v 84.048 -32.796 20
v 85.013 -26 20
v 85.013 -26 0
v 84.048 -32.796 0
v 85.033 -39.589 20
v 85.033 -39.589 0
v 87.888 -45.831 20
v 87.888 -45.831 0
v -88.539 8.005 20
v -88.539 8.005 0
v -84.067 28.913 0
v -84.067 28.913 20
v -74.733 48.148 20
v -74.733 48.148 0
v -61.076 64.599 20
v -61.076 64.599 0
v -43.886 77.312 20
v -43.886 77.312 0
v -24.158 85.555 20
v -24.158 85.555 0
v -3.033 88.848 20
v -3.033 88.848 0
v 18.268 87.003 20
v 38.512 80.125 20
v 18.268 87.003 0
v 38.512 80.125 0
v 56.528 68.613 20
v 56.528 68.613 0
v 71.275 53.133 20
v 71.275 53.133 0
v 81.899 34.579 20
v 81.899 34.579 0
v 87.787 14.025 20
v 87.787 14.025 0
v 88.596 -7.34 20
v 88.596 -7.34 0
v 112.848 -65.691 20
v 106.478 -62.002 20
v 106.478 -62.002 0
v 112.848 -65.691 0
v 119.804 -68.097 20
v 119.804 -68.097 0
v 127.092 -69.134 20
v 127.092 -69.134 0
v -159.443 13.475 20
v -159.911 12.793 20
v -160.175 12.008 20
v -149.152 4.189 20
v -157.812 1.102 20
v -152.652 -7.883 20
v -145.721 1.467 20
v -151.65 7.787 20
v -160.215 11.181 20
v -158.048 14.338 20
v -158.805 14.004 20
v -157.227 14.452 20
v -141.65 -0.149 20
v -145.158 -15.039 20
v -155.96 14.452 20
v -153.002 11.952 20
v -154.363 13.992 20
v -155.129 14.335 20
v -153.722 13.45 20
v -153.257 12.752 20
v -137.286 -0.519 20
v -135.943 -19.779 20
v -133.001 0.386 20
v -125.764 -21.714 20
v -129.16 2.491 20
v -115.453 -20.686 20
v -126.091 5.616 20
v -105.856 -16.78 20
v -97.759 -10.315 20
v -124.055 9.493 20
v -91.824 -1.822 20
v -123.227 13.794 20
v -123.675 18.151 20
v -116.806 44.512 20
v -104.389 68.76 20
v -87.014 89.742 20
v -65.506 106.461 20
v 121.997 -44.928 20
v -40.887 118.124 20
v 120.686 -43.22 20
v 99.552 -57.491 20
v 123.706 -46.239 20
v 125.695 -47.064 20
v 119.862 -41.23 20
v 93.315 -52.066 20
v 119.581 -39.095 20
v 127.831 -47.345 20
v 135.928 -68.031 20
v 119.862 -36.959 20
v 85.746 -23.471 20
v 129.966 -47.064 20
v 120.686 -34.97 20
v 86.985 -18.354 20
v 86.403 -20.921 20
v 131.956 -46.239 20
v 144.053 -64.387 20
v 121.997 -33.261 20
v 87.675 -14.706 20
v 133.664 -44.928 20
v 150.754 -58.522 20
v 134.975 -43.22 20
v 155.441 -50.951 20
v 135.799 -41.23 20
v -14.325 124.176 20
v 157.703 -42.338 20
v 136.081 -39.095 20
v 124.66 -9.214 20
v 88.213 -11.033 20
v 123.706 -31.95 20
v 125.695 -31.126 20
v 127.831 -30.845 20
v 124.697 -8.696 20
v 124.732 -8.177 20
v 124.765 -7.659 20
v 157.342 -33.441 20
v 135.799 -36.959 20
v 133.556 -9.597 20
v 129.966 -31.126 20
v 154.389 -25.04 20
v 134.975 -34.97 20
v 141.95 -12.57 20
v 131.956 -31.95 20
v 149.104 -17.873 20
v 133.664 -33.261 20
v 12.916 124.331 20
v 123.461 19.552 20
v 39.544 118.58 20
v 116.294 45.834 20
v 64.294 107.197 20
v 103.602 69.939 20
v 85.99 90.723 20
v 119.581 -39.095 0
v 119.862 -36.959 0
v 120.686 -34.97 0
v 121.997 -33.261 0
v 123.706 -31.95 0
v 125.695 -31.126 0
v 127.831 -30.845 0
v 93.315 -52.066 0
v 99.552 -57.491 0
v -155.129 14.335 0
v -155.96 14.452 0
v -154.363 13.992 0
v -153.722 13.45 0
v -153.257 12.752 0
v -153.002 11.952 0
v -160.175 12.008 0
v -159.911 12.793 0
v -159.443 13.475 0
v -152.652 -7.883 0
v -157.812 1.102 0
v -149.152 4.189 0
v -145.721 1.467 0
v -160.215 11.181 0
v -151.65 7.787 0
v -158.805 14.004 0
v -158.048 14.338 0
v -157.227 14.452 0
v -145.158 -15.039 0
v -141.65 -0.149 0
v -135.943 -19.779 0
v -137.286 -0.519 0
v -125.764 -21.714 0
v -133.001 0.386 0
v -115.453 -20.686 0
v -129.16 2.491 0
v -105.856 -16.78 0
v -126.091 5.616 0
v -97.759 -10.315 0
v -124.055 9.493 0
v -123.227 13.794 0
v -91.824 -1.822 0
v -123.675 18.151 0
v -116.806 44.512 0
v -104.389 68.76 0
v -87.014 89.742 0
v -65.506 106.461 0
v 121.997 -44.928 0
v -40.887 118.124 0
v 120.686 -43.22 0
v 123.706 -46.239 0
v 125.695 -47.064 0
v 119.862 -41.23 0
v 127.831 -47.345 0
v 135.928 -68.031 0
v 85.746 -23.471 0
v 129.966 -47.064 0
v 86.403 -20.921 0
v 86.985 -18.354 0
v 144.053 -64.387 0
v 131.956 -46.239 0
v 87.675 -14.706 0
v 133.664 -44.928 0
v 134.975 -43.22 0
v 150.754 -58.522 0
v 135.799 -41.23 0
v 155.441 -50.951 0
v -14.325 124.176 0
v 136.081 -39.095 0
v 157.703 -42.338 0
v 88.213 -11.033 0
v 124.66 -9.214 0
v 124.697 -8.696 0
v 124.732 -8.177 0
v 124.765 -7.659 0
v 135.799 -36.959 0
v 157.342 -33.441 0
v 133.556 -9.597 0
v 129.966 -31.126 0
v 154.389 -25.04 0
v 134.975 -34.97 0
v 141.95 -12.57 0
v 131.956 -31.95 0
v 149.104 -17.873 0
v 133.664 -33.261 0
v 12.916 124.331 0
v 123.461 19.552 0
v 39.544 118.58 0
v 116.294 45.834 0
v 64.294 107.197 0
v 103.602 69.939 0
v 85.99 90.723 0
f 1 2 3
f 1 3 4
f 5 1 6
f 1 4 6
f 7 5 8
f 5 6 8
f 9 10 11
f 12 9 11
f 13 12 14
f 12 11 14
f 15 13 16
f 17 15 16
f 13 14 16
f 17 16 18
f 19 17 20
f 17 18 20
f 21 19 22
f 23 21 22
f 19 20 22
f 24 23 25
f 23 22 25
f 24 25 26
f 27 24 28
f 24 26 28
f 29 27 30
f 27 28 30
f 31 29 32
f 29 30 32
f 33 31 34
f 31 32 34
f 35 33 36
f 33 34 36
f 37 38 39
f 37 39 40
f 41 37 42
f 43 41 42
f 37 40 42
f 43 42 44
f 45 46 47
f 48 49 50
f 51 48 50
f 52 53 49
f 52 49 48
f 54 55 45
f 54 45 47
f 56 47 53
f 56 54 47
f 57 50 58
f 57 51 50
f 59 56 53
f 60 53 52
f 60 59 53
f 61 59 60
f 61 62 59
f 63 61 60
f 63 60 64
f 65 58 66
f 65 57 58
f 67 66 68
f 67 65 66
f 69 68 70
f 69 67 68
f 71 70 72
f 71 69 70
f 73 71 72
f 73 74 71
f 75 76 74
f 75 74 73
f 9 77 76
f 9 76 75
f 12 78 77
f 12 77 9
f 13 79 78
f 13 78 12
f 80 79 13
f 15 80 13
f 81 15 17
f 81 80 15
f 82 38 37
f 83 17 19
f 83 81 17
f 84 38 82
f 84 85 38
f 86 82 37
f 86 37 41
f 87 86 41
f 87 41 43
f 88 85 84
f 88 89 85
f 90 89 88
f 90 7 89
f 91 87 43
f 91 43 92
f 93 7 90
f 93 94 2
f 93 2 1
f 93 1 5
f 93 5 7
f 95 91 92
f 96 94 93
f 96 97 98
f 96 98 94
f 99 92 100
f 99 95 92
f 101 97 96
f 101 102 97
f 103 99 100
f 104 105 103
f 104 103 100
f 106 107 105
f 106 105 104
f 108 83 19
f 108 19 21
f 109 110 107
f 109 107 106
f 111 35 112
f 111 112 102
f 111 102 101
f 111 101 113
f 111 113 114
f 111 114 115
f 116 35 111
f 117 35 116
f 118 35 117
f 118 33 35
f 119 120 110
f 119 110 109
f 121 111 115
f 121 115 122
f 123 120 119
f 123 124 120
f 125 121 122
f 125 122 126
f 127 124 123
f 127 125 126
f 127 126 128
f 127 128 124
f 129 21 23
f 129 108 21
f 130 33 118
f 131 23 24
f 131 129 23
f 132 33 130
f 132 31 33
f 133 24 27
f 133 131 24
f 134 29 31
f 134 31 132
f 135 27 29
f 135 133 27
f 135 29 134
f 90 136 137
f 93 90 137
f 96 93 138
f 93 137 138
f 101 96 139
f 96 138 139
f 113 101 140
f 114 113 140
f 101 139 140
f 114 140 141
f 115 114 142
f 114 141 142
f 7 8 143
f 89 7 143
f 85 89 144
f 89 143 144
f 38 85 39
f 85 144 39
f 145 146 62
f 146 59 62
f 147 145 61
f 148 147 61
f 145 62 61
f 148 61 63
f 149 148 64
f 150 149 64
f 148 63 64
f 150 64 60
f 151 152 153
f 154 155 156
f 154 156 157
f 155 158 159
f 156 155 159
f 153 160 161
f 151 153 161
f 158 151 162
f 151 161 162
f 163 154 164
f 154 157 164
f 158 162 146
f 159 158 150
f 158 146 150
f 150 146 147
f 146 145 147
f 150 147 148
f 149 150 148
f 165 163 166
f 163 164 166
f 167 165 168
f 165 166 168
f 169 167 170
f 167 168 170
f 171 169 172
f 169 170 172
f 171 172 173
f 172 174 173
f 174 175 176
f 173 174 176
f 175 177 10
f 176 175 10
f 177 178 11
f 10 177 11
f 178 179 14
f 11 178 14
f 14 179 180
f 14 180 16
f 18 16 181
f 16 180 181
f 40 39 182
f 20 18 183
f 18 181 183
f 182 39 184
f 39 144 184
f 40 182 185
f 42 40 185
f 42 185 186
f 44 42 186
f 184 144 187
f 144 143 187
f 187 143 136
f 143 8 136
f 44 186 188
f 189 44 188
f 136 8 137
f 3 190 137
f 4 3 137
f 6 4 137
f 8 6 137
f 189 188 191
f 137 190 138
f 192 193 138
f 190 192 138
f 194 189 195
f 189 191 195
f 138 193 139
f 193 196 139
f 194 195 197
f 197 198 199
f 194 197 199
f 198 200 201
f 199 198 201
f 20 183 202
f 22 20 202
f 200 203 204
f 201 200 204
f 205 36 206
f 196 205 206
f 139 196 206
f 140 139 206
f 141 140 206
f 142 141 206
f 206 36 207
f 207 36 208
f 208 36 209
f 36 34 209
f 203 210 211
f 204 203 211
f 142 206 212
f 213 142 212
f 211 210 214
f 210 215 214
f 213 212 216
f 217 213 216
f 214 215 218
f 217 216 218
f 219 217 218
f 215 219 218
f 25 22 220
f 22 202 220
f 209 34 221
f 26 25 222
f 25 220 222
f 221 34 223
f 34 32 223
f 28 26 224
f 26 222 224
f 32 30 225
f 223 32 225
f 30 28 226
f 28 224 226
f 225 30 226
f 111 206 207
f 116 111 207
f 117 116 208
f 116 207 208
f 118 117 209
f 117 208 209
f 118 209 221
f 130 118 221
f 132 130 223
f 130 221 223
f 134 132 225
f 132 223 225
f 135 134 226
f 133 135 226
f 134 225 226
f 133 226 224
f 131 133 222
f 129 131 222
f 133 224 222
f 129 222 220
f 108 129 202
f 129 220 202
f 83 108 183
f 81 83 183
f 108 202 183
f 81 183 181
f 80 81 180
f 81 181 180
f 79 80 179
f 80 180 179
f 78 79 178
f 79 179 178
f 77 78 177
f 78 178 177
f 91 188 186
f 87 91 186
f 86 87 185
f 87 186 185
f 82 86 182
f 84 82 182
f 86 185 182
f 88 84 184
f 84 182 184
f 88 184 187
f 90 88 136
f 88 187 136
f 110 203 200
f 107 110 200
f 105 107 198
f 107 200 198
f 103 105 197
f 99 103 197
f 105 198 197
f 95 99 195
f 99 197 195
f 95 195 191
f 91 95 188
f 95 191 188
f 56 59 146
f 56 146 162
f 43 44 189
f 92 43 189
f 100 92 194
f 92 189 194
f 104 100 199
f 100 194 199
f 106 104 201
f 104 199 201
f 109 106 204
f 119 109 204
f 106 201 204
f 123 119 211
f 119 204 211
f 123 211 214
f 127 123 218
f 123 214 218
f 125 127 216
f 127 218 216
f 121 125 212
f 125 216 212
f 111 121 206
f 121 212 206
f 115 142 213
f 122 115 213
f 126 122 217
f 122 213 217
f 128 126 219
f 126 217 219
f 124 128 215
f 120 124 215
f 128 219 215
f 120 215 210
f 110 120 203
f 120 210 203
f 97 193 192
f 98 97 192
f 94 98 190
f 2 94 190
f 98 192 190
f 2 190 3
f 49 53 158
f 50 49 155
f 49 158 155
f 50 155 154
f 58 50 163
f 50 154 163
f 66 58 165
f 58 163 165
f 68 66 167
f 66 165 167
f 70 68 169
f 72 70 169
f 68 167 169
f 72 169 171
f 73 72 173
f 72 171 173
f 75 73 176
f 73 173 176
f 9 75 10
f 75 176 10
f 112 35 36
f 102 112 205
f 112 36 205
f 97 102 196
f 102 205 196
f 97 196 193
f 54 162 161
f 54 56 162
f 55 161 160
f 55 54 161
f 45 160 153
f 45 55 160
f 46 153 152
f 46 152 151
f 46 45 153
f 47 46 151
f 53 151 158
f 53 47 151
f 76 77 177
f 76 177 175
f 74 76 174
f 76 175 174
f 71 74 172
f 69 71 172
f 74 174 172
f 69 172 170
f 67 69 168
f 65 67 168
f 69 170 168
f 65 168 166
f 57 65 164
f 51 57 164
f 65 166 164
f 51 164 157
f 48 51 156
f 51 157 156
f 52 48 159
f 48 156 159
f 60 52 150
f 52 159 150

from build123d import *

# Parameters (mm, degrees)
F1_DEPTH = 20
F2_R     = 3


# Not quite as in the source:
# - a feature names something its author has since deleted; it is built from what else it names


with BuildPart() as f1:
    # F0 (on Top) → F1 (new body)
    with BuildSketch(Plane.XY):
        with BuildLine():
            Line((-153.2121218782, 14.4520842503), (-160.3632725747, 14.4520842503))
            ThreePointArc((-160.3632725747, 14.4520842503), (-127.3979918157, -21.6045066339), (-88.538816916, 8.0054918097))
            ThreePointArc((-88.538816916, 8.0054918097), (7.672936475, 88.5682564232), (88.5964468438, -7.3402729282))
            ThreePointArc((88.5964468438, -7.3402729282), (87.9631543537, -12.872197798), (86.984793992, -18.3536267309))
            ThreePointArc((86.984793992, -18.3536267309), (86.0838715562, -22.1985823397), (85.013080464, -25.9997336529))
            ThreePointArc((85.013080464, -25.9997336529), (84.2979595084, -36.2275225271), (87.887852798, -45.8312577069))
            ThreePointArc((87.887852798, -45.8312577069), (96.3394016955, -54.8865279313), (106.4780767567, -62.0022756507))
            ThreePointArc((106.4780767567, -62.0022756507), (116.2685705091, -67.06105094), (127.0920702884, -69.1339300658))
            ThreePointArc((127.0920702884, -69.1339300658), (157.854119606, -37.8760326334), (124.6599386157, -9.2141035549))
            ThreePointArc((124.6599386157, -9.2141035549), (124.7149682754, -8.4366277665), (124.7651490421, -7.6588239637))
            ThreePointArc((124.7651490421, -7.6588239637), (12.9161691706, 124.330899514), (-123.675215649, 18.1505105758))
            ThreePointArc((-123.675215649, 18.1505105758), (-136.3484686697, -0.431692042), (-153.2121218782, 14.4520842503))
        make_face()
        with BuildLine():
            ThreePointArc((127.83052, -30.8446834837), (133.6641509448, -33.2610525389), (136.08052, -39.0946834837))
            ThreePointArc((136.08052, -39.0946834837), (133.6641509448, -44.9283144285), (127.83052, -47.3446834837))
            ThreePointArc((127.83052, -47.3446834837), (121.9968890552, -44.9283144285), (119.58052, -39.0946834837))
            ThreePointArc((119.58052, -39.0946834837), (121.9968890552, -33.2610525389), (127.83052, -30.8446834837))
        make_face(mode=Mode.SUBTRACT)
    extrude(amount=F1_DEPTH)

    # F2
    f2_edges = [f1.edges().sort_by_distance(p)[0] for p in [
        (-160.363273, 14.452084, 10),
        (-153.212122, 14.452084, 10),
    ]]
    fillet(f2_edges, radius=F2_R)


solid = f1.part
